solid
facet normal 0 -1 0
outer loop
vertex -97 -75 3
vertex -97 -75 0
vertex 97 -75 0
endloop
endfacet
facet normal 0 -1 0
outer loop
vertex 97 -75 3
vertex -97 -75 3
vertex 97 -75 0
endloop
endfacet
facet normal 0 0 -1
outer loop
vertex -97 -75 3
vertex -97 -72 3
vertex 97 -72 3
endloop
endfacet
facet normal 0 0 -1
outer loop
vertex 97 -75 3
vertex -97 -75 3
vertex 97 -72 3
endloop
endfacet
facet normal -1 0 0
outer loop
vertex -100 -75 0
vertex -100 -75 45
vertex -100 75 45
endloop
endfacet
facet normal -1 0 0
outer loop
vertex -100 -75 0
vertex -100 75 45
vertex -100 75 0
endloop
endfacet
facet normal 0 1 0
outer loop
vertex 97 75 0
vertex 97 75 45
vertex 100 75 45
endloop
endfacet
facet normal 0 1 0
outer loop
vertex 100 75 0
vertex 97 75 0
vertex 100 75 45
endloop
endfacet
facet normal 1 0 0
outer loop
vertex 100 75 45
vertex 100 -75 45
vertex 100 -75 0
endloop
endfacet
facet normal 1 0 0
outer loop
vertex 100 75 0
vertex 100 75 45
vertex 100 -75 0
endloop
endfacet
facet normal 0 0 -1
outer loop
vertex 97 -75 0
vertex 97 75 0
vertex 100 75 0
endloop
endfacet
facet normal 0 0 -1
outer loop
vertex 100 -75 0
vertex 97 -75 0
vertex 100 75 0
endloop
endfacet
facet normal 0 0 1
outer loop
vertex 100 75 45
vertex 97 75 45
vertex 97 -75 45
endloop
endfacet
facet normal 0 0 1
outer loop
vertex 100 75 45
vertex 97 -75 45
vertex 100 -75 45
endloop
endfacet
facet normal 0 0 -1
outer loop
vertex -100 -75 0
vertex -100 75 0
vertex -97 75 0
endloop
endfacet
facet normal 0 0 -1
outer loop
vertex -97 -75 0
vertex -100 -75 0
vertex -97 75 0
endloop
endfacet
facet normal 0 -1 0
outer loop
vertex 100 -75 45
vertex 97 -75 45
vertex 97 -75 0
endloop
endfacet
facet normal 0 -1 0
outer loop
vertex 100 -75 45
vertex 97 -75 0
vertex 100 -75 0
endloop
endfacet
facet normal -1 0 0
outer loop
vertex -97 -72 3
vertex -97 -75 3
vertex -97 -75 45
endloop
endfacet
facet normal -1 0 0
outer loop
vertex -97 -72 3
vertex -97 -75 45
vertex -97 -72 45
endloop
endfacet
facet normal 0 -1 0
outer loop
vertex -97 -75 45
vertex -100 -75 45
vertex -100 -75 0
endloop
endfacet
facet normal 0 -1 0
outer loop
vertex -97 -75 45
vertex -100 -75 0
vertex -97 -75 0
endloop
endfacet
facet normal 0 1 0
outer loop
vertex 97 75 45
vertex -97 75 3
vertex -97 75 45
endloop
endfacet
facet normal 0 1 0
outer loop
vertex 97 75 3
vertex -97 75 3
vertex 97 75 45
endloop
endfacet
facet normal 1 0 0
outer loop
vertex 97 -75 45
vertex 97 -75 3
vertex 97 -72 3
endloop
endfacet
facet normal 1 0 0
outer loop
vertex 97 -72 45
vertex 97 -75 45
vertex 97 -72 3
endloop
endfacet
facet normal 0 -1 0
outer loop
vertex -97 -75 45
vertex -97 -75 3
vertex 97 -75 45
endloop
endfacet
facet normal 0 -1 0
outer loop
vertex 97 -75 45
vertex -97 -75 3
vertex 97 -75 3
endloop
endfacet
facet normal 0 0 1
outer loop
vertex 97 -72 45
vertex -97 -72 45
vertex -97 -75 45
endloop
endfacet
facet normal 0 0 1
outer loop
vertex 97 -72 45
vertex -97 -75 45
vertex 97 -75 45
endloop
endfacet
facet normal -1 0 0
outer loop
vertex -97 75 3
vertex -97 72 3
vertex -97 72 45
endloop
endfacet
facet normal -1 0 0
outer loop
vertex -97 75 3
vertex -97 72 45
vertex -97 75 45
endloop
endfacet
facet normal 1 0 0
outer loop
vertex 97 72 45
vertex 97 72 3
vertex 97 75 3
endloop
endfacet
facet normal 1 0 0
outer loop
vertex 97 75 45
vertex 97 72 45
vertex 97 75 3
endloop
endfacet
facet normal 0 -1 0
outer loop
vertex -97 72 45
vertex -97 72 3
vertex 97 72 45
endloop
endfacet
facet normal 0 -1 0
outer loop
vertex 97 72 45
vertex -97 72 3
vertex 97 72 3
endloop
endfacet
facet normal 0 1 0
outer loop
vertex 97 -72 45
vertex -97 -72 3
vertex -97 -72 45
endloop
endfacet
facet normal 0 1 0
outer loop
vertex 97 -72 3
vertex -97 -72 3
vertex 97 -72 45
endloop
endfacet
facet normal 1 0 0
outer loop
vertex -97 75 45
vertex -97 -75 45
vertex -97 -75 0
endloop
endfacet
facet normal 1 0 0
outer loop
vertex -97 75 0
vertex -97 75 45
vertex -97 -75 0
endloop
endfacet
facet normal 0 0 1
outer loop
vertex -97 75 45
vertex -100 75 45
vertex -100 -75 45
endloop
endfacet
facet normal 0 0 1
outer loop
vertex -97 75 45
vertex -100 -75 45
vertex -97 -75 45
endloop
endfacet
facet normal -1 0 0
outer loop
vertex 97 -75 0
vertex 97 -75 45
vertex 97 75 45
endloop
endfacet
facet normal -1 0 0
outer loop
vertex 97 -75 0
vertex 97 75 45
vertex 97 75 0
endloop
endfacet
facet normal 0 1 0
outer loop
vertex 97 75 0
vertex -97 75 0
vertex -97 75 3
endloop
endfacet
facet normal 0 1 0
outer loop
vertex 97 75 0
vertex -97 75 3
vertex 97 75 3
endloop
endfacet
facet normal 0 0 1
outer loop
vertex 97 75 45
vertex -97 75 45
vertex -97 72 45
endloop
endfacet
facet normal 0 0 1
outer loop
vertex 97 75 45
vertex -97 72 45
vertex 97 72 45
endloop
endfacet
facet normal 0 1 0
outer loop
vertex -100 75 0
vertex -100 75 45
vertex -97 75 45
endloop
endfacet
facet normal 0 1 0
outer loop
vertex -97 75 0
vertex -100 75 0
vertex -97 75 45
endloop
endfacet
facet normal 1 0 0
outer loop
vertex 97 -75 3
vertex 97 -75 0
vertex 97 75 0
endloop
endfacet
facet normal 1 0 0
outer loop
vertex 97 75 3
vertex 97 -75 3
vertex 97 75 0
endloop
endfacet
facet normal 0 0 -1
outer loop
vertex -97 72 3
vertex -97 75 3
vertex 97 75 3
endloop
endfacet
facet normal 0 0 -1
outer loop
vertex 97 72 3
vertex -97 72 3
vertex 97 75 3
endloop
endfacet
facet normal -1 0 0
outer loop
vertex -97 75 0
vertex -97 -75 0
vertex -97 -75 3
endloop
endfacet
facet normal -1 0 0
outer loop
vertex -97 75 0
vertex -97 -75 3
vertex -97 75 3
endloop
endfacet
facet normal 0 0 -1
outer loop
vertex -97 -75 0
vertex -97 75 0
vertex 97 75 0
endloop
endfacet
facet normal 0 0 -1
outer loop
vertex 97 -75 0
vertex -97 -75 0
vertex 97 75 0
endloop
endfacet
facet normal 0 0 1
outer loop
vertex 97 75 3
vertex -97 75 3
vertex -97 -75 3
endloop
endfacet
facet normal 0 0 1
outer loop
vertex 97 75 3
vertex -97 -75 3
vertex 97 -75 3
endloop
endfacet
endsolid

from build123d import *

# Parameters (mm, degrees)
ESQUISSE1_W          = 194
ESQUISSE1_H          = 150
BOSS_EXTRU_1_DEPTH   = 3
ESQUISSE3_W          = 3
ESQUISSE3_H          = 45
BOSS_EXTRU_3_DEPTH   = 150
BOSS_EXTRU_3_2_DEPTH = 150
ESQUISSE4_W          = 194
ESQUISSE4_H          = 3
BOSS_EXTRU_4_DEPTH   = 42
BOSS_EXTRU_4_2_DEPTH = 42


with BuildPart() as part:
    # Esquisse1 → Boss.-Extru.1 (new body)
    with BuildSketch(Plane.XY):
        Rectangle(ESQUISSE1_W, ESQUISSE1_H)
    extrude(amount=BOSS_EXTRU_1_DEPTH)


with BuildPart() as body_2:
    # Esquisse3 → Boss.-Extru.3 (new body)
    with BuildSketch(Plane(origin=(0, 75, 0), x_dir=(1, 0, 0), z_dir=(0, 1, 0))):
        with Locations((-98.5, -22.5)):
            Rectangle(ESQUISSE3_W, ESQUISSE3_H)
    extrude(amount=-BOSS_EXTRU_3_DEPTH)


with BuildPart() as body_3:
    # Esquisse3 → Boss.-Extru.3 2 (new body)
    with BuildSketch(Plane(origin=(0, 75, 0), x_dir=(1, 0, 0), z_dir=(0, 1, 0))):
        with Locations((98.5, -22.5)):
            Rectangle(ESQUISSE3_W, ESQUISSE3_H)
    extrude(amount=-BOSS_EXTRU_3_2_DEPTH)


with BuildPart() as body_4:
    # Esquisse4 → Boss.-Extru.4 (new body)
    with BuildSketch(Plane.XY.offset(3)):
        with Locations((0, 73.5)):
            Rectangle(ESQUISSE4_W, ESQUISSE4_H)
    extrude(amount=BOSS_EXTRU_4_DEPTH)


with BuildPart() as body_5:
    # Esquisse4 → Boss.-Extru.4 2 (new body)
    with BuildSketch(Plane.XY.offset(3)):
        with Locations((0, -73.5)):
            Rectangle(ESQUISSE4_W, ESQUISSE4_H)
    extrude(amount=BOSS_EXTRU_4_2_DEPTH)


solid = Compound([part.part, body_2.part, body_3.part, body_4.part, body_5.part])
